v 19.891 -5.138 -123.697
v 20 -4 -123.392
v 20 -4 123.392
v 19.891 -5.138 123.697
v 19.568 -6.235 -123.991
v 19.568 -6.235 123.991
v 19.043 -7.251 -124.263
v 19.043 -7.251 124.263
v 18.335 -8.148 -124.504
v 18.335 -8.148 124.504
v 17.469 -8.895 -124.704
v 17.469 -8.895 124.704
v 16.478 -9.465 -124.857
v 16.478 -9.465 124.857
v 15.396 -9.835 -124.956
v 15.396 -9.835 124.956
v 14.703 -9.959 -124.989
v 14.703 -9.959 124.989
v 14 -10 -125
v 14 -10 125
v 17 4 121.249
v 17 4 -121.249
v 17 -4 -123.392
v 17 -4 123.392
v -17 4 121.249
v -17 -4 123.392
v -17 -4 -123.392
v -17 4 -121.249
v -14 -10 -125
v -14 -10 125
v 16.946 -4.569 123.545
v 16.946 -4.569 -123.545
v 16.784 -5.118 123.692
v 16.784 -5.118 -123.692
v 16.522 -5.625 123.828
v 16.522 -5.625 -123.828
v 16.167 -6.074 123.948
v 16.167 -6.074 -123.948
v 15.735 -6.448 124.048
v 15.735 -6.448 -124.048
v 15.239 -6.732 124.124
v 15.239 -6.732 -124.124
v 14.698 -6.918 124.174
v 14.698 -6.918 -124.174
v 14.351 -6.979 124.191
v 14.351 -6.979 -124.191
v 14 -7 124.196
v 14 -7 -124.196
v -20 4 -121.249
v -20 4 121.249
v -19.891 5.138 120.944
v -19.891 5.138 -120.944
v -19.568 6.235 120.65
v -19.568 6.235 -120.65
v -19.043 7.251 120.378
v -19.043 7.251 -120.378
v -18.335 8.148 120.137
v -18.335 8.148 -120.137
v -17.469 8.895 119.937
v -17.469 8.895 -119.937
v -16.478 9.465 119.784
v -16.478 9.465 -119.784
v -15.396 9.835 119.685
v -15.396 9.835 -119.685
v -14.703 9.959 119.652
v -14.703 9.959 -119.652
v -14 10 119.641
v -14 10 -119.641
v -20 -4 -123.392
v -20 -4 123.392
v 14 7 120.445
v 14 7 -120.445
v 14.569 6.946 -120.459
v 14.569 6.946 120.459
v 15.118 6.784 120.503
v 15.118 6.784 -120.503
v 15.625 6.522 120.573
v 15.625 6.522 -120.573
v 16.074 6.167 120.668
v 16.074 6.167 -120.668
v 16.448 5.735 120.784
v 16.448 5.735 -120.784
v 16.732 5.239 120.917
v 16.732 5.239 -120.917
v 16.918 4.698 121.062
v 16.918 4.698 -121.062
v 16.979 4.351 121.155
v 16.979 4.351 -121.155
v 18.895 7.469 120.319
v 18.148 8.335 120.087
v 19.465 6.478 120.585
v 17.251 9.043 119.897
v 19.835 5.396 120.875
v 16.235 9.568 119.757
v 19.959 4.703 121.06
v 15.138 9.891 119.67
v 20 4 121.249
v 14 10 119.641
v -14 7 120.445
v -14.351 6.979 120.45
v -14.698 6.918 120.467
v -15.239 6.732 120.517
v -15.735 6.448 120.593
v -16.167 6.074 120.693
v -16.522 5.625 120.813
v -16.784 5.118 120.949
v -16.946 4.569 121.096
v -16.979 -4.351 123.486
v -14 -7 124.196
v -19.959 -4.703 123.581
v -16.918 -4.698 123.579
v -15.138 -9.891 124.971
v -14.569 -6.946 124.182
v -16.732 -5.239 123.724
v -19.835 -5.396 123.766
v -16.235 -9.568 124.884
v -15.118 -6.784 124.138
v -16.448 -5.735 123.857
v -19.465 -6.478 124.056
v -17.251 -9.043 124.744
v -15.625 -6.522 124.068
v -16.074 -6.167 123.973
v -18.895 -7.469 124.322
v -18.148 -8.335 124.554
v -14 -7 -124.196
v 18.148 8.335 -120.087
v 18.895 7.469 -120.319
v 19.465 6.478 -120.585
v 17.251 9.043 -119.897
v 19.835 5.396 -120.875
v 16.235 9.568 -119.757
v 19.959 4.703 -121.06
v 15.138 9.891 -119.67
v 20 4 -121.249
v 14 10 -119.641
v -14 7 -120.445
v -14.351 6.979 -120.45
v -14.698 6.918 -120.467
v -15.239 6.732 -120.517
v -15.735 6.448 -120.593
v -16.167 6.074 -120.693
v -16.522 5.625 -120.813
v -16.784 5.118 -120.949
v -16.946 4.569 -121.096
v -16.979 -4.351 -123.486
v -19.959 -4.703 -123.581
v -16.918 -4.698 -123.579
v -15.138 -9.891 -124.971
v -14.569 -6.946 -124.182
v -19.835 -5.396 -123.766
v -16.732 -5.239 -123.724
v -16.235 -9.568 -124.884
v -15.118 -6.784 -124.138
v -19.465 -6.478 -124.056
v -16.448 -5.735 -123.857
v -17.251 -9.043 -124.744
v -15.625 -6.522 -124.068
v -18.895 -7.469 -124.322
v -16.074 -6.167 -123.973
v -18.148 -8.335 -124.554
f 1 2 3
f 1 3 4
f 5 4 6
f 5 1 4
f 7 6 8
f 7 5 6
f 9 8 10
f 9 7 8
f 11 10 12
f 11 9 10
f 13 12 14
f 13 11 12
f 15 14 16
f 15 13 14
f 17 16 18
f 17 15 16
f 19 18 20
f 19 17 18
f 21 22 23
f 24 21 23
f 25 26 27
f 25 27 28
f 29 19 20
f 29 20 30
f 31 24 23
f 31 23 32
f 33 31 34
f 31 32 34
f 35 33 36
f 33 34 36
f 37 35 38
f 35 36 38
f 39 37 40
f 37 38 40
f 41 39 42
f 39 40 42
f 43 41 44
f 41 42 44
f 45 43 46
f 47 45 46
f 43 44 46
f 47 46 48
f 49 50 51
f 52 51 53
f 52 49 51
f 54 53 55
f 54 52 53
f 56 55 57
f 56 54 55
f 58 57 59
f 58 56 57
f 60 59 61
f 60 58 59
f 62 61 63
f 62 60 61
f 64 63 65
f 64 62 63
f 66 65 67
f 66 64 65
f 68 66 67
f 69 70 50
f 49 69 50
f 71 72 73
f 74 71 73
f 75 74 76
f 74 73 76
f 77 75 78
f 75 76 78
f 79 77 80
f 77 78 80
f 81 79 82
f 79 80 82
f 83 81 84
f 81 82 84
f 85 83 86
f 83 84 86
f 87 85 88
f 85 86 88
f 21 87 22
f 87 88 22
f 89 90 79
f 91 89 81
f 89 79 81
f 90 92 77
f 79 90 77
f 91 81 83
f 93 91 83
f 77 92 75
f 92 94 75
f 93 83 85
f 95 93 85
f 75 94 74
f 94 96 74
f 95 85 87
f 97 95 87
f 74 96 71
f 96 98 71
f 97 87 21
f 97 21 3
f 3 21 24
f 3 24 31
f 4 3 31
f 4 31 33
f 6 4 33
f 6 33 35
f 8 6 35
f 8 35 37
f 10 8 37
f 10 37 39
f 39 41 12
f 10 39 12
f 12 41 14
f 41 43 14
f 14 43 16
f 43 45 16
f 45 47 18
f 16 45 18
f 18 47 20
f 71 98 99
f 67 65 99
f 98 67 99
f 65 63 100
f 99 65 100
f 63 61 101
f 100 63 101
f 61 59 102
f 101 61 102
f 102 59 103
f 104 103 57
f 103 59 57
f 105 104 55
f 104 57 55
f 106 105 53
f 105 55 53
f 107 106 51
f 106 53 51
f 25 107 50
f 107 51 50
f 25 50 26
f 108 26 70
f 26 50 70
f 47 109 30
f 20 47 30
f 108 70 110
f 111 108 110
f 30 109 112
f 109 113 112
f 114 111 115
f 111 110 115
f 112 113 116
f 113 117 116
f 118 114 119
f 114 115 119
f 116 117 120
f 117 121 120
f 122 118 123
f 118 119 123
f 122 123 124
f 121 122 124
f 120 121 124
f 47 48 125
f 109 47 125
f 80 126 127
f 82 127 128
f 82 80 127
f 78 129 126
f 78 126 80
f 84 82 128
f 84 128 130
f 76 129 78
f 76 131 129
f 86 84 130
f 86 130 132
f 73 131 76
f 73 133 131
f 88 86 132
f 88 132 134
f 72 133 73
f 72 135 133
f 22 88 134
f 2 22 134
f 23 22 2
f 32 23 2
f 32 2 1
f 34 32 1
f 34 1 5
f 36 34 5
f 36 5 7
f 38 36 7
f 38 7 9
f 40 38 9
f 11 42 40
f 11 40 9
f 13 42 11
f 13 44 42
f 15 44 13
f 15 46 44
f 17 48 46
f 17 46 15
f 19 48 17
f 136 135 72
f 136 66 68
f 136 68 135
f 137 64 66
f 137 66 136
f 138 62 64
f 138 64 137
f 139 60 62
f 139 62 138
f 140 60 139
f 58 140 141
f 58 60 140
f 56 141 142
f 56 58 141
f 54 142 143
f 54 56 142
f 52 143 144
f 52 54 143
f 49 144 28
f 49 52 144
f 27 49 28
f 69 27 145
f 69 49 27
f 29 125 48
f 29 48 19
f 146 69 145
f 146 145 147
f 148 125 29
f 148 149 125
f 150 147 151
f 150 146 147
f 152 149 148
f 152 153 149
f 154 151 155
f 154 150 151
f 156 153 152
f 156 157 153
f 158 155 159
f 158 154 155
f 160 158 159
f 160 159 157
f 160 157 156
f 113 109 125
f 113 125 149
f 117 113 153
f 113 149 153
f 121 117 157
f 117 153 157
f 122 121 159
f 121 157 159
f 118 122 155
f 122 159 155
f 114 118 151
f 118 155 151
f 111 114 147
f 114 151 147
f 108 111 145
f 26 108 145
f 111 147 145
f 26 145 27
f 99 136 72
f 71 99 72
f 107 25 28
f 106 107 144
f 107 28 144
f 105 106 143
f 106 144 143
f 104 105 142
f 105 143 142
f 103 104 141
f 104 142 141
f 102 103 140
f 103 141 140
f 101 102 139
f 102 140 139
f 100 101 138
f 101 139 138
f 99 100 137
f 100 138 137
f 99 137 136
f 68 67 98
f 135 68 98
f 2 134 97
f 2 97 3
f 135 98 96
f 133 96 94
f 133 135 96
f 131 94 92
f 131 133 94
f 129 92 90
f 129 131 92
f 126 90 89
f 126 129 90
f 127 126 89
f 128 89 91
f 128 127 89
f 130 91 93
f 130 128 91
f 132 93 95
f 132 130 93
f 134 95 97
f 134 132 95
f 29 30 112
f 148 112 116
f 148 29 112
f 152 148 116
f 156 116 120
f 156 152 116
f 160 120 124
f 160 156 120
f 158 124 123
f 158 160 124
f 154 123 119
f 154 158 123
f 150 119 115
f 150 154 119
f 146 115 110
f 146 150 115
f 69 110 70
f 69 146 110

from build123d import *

# Parameters (mm, degrees)
EXTRUDE_1_DEPTH      = 125
EXTRUDE_1_DEPTH_BACK = 125
SHELL_1_T            = -3
CHAMFER_1_SIZE       = 5.358983849
CHAMFER_1_SIZE_2     = 20


with BuildPart() as part:
    # Эскиз1 → Бобышка-Вытянуть1 (new, two sides: drawn at the far end of the back side and taken through both)
    with BuildSketch(Plane.XY.offset(-EXTRUDE_1_DEPTH_BACK)):
        with BuildLine():
            Line((-14, 10), (14, 10))
            ThreePointArc((14, 10), (18.242640687, 8.242640687), (20, 4))
            Line((20, 4), (20, -4))
            ThreePointArc((20, -4), (18.242640687, -8.242640687), (14, -10))
            Line((14, -10), (-14, -10))
            ThreePointArc((-14, -10), (-18.242640687, -8.242640687), (-20, -4))
            Line((-20, -4), (-20, 4))
            ThreePointArc((-20, 4), (-18.242640687, 8.242640687), (-14, 10))
        make_face()
    extrude(amount=EXTRUDE_1_DEPTH + EXTRUDE_1_DEPTH_BACK)

    # Оболочка1
    shell_1_openings = [part.faces().sort_by_distance(p)[0] for p in [
        (0, 0, -125),
        (0, 0, 125),
    ]]
    offset(amount=SHELL_1_T, openings=shell_1_openings, kind=Kind.INTERSECTION)

    # Фаска1
    # the kernel refuses this chamfer: 20, 5.358983849 mm, written as the material it takes off along each edge
    with BuildSketch(Plane(origin=(-65.934431404, 10, -125), x_dir=(0, 0.13751244702128945, 0.9905000388259543), z_dir=(1, 0, 0))) as chamfer_1_piece_1:
        Polygon((CHAMFER_1_SIZE * 0.990500038756, CHAMFER_1_SIZE * 0.137512447012), (-CHAMFER_1_SIZE_2 * 0.137512447021, CHAMFER_1_SIZE_2 * 0.990500038826), (0, 0), align=None)
    extrude(amount=131.868862808, mode=Mode.SUBTRACT)
    with BuildSketch(Plane(origin=(-65.934431404, 10, 125), x_dir=(0, 0.13751244702128945, -0.9905000388259543), z_dir=(1, 0, 0))) as chamfer_1_piece_2:
        Polygon((CHAMFER_1_SIZE * 0.990500038756, -CHAMFER_1_SIZE * 0.137512447012), (-CHAMFER_1_SIZE_2 * 0.137512447021, -CHAMFER_1_SIZE_2 * 0.990500038826), (0, 0), align=None)
    extrude(amount=131.868862808, mode=Mode.SUBTRACT)


solid = part.part
